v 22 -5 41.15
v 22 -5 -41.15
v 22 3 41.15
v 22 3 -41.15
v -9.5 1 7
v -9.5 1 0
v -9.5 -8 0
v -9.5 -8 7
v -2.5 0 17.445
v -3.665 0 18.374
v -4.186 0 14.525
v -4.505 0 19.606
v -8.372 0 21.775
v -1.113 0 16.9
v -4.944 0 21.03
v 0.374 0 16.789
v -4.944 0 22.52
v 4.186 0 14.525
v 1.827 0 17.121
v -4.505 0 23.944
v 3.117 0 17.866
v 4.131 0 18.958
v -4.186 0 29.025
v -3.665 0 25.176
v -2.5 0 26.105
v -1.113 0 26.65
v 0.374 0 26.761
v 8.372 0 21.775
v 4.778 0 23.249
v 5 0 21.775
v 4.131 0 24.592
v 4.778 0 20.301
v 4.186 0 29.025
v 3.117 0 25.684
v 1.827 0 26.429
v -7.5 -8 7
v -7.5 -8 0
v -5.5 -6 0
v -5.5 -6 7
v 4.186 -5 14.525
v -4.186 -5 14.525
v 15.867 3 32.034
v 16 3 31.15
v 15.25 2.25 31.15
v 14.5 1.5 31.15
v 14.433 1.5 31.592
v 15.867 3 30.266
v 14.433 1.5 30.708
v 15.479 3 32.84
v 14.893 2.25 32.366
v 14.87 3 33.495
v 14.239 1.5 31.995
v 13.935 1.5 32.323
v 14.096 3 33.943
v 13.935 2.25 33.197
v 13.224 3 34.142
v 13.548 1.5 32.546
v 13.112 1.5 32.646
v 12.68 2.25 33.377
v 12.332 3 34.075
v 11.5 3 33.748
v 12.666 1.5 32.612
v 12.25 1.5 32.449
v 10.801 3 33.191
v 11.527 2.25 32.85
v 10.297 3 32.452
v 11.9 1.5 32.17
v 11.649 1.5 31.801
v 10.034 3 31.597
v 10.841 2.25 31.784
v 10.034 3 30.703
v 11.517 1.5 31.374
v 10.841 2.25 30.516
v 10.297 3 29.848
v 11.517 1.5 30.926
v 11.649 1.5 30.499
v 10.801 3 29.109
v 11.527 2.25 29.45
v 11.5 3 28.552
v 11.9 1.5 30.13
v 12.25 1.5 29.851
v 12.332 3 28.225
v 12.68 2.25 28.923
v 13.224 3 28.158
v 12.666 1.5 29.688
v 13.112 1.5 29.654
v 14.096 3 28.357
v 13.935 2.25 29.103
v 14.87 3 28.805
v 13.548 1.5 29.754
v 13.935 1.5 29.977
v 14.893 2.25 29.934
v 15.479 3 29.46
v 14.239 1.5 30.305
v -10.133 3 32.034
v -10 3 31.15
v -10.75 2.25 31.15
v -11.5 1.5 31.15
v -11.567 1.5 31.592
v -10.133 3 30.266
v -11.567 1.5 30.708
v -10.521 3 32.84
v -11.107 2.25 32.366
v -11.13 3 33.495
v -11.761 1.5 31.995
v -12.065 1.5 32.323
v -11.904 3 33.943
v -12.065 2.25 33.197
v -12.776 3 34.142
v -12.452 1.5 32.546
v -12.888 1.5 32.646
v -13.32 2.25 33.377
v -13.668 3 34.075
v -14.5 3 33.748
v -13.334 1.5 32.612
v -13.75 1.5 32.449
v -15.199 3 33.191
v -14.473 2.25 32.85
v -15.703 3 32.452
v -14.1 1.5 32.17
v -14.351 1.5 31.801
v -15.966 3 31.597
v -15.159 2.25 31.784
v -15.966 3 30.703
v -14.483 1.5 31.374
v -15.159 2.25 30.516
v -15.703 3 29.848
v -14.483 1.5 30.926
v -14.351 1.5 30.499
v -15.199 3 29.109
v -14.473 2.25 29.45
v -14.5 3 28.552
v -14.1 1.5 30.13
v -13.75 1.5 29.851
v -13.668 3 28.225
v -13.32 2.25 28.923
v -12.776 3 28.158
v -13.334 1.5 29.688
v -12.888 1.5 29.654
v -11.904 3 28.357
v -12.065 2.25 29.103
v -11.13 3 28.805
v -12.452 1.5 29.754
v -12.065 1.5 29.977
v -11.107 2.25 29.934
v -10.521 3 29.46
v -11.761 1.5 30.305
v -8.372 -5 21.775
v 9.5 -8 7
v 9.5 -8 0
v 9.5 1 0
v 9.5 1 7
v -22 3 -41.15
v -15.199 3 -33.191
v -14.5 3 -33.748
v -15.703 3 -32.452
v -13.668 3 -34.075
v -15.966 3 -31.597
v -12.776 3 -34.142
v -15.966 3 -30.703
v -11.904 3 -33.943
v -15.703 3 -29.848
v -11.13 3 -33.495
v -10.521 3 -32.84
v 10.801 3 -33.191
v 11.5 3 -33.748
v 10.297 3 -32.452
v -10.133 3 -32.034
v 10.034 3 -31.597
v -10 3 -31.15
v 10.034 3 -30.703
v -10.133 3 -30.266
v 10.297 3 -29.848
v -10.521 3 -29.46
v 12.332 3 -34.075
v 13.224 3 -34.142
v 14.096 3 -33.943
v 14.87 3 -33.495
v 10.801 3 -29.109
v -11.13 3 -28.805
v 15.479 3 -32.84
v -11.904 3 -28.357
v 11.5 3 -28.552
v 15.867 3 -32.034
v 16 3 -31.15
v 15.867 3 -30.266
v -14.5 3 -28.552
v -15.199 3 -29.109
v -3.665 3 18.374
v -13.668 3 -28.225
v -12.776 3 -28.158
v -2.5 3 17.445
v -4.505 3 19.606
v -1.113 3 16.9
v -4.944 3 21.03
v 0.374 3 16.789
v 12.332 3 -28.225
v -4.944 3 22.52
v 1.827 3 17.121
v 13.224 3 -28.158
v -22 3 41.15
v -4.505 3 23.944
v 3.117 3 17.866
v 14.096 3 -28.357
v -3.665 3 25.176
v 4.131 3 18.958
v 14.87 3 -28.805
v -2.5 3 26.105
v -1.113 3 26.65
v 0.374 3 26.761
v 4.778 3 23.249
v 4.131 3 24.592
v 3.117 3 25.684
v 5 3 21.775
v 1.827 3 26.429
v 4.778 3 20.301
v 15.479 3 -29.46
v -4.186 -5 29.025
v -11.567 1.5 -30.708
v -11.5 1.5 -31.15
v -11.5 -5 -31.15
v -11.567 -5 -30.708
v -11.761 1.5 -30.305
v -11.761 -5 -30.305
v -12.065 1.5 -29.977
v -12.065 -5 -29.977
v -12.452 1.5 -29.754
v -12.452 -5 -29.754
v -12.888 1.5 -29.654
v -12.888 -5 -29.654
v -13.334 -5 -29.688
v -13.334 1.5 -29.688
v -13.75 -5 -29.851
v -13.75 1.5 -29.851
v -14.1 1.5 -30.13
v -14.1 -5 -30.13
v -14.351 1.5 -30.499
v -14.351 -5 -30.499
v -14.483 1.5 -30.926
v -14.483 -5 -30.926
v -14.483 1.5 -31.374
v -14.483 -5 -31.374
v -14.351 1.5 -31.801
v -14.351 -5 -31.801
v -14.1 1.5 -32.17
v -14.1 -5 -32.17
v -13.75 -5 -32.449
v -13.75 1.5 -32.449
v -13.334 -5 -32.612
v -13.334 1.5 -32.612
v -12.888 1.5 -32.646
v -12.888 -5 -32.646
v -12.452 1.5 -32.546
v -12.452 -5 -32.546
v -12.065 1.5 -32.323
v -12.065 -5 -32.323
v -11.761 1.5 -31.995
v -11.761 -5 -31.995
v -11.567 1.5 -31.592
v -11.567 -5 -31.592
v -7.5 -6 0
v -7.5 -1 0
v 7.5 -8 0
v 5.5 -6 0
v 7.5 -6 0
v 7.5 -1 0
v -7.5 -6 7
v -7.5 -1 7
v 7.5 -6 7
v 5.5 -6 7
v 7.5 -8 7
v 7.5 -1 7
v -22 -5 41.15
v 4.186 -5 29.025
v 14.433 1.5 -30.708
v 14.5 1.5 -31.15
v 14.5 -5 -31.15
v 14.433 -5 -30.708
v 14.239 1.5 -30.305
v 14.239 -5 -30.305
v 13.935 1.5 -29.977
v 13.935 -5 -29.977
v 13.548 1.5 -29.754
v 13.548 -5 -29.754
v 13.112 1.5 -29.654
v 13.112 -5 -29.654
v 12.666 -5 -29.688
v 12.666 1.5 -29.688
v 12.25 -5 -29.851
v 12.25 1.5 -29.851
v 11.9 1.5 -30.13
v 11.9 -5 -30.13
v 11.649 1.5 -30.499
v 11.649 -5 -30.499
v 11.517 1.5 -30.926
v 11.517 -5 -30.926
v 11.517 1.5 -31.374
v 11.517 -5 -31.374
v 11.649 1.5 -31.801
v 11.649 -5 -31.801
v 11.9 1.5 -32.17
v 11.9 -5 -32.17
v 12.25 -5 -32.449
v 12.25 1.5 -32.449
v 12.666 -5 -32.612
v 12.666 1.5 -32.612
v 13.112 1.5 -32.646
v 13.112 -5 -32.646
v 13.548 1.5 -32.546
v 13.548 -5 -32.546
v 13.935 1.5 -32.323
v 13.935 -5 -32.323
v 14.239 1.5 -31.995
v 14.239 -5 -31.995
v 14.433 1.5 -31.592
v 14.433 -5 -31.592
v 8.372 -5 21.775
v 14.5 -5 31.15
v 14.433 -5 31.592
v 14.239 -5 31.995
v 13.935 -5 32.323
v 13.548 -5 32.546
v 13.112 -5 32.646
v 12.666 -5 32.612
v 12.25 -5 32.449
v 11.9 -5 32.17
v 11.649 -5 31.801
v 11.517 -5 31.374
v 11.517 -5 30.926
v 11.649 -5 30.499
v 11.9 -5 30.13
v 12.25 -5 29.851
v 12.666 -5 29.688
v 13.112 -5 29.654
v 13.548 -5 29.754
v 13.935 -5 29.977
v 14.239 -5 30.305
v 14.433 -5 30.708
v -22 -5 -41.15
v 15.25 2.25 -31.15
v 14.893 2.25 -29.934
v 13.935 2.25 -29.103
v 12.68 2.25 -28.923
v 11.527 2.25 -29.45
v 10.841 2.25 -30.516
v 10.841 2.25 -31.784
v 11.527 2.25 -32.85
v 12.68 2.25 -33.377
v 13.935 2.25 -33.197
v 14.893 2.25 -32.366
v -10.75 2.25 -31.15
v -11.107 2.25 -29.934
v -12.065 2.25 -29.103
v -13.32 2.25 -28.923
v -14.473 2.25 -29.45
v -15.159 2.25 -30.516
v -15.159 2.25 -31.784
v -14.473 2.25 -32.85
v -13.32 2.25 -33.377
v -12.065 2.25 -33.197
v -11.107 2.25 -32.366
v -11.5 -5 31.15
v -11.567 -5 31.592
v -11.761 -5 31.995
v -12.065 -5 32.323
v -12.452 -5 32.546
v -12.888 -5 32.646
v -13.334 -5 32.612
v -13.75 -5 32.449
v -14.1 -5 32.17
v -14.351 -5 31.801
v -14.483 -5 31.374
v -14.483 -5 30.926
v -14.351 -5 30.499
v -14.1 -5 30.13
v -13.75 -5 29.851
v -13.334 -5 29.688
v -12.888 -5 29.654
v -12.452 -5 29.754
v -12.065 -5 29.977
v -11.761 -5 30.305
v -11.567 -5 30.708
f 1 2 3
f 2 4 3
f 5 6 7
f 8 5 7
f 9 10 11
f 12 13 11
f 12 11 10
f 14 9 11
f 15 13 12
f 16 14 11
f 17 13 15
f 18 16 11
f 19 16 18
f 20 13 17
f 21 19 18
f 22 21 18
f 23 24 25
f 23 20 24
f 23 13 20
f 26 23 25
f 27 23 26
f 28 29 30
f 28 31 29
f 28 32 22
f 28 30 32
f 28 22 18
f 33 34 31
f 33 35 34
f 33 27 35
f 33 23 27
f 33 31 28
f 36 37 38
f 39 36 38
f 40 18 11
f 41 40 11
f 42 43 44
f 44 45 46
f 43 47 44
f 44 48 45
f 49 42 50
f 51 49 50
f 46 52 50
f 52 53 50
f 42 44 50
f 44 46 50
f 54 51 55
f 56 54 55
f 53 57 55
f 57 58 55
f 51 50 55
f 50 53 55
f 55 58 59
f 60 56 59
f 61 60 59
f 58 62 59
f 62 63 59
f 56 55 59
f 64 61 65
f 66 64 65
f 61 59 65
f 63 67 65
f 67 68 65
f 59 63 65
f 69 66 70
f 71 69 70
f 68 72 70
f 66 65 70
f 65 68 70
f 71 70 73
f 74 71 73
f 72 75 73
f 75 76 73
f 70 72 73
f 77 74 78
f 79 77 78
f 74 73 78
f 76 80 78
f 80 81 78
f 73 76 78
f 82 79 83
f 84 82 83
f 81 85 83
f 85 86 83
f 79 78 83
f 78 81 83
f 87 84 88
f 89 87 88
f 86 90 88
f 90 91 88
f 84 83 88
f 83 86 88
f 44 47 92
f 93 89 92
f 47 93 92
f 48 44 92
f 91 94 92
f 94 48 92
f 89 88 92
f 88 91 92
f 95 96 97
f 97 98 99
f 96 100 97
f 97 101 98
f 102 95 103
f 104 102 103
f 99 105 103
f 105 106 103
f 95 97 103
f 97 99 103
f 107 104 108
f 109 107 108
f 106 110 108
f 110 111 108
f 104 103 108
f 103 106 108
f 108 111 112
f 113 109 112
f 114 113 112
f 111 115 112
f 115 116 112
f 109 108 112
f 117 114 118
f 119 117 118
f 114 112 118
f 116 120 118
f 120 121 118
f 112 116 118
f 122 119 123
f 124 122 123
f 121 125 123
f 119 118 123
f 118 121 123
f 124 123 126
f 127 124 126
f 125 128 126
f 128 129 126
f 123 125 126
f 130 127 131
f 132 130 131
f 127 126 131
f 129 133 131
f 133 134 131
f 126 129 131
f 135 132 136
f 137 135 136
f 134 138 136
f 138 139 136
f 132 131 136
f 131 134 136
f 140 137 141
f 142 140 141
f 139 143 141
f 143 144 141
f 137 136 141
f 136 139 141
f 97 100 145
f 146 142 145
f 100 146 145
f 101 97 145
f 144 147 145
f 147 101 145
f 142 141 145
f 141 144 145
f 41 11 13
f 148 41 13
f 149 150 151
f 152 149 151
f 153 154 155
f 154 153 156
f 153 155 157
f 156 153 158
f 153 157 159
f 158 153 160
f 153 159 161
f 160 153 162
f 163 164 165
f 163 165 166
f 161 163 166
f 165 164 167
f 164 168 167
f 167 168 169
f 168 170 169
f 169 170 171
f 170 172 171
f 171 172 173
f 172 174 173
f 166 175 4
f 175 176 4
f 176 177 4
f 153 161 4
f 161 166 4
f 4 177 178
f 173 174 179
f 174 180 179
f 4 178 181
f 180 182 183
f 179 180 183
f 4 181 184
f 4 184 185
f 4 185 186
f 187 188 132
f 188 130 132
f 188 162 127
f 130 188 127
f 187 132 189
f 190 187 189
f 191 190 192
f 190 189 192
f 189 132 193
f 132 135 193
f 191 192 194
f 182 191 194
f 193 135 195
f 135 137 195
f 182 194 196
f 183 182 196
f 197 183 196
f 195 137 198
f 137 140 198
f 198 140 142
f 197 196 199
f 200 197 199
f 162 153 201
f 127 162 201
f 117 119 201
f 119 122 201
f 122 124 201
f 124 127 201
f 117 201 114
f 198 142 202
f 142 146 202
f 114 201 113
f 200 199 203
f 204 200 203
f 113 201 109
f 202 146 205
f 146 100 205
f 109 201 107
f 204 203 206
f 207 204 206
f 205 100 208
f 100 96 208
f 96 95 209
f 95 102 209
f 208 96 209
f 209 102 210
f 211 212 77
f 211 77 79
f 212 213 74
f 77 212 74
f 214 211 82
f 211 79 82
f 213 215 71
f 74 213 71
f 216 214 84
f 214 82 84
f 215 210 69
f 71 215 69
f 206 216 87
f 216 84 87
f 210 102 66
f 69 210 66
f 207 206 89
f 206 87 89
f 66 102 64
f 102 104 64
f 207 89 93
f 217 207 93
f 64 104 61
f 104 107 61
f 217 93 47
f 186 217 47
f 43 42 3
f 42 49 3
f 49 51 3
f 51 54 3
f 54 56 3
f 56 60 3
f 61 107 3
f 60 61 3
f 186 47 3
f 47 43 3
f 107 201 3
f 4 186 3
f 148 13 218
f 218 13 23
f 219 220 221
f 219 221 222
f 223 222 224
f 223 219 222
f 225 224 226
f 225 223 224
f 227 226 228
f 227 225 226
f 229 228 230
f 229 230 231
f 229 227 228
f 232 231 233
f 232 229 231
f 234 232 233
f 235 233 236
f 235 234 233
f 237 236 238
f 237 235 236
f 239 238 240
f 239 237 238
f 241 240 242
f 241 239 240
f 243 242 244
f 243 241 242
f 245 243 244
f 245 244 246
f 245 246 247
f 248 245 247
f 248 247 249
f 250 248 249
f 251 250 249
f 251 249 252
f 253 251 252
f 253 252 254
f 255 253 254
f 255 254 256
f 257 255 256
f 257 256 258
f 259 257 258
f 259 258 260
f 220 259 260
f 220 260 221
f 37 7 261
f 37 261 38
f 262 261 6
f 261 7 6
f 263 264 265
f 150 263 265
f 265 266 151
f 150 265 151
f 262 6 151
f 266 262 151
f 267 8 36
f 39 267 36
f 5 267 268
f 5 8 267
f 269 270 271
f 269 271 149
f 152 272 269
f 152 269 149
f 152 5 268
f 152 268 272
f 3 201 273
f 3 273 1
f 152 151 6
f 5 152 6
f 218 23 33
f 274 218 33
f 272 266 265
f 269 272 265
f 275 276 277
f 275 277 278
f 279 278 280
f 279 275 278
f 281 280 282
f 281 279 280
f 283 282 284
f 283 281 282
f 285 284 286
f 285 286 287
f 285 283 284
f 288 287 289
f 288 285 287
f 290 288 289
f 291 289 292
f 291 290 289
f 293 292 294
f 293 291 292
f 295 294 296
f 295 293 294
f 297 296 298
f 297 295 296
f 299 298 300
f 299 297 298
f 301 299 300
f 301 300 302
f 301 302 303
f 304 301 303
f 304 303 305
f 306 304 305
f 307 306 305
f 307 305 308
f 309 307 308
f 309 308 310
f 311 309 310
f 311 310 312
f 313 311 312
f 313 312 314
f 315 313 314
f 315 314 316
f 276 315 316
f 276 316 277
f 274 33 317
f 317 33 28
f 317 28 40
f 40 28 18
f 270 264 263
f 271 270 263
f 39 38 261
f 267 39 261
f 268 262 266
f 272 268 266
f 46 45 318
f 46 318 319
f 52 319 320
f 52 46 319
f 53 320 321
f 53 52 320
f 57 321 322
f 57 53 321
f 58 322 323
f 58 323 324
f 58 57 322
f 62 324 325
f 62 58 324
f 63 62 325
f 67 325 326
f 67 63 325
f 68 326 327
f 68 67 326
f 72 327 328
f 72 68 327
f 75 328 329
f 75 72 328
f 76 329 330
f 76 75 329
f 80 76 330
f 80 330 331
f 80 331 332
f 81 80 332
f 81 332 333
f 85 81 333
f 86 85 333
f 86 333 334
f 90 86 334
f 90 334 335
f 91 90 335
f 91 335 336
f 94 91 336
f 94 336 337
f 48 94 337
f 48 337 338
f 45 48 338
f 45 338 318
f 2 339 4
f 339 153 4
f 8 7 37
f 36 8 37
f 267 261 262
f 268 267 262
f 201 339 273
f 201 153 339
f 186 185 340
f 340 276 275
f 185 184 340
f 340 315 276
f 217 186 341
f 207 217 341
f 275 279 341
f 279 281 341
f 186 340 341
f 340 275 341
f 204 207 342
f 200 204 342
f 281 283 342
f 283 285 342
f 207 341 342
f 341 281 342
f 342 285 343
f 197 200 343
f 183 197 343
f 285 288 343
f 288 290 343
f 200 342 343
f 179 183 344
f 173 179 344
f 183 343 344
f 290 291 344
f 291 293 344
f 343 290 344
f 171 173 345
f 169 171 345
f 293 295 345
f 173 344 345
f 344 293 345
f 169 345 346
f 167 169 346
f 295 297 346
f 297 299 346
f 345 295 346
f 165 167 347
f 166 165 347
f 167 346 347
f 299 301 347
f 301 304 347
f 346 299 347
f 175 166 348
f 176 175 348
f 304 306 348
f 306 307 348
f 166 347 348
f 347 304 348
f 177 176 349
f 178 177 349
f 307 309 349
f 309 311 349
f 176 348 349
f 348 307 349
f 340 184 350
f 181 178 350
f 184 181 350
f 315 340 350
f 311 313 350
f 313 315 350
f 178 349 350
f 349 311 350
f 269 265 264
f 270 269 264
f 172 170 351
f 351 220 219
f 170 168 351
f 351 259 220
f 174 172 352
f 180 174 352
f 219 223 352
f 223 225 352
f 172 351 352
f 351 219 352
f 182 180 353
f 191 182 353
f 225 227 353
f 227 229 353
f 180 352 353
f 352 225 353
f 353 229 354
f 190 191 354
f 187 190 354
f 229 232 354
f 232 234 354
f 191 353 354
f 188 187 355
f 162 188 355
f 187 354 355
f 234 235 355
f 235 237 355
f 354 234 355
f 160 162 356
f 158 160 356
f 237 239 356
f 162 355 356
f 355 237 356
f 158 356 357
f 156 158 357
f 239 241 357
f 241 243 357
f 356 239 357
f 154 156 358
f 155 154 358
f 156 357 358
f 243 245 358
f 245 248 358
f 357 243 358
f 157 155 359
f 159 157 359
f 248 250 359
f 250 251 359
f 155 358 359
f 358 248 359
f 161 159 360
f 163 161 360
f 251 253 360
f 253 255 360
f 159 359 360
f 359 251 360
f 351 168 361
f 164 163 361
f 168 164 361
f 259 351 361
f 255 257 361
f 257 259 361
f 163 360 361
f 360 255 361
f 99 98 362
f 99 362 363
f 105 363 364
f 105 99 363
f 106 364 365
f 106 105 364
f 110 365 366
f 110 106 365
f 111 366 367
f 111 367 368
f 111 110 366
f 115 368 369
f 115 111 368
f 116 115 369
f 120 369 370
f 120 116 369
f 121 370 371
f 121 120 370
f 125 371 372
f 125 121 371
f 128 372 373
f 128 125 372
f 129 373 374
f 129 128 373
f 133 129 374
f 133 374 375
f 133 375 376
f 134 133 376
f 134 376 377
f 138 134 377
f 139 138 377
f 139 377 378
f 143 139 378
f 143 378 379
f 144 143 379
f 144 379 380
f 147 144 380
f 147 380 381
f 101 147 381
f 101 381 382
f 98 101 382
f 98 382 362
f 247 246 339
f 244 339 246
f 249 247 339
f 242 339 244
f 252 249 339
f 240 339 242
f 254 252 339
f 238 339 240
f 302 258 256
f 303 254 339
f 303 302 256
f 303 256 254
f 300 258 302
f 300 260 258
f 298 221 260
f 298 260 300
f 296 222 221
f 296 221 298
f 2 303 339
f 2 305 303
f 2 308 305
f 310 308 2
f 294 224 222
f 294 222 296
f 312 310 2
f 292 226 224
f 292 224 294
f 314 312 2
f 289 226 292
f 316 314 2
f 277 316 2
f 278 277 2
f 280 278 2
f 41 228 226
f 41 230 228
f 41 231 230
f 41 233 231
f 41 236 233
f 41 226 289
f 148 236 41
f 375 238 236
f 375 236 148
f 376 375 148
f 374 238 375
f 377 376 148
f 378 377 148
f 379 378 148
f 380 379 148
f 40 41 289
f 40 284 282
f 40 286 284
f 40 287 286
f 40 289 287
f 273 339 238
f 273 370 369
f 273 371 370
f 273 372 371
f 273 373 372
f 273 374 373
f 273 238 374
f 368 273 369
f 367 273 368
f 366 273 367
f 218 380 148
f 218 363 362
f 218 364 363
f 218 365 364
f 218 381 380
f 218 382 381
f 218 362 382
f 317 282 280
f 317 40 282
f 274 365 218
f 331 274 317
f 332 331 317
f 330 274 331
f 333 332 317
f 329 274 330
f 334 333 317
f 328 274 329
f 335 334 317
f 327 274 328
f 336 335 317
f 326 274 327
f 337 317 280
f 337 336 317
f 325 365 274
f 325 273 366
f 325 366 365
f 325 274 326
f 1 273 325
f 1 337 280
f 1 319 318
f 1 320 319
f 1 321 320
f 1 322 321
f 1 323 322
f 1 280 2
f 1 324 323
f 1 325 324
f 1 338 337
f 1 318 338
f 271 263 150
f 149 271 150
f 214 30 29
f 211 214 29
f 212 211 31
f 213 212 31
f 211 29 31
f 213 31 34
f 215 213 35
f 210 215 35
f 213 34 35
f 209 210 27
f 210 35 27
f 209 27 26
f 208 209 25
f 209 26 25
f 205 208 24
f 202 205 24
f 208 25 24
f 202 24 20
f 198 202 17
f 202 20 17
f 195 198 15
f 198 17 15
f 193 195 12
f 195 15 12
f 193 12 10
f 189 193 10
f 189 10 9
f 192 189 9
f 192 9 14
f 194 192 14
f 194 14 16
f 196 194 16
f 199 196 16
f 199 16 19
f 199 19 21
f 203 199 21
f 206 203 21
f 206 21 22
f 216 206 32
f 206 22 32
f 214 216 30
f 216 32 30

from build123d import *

# Parameters (mm, degrees)
F0_W     = 44
F0_H     = 82.3
F0_R     = 1.5
F0_R_2   = 5
F1_DEPTH = 3
F2_DEPTH = 5
F3_SIZE  = 1.5
F4_W     = 15
F4_H     = 2
F5_DEPTH = 7


with BuildPart() as f1:
    # F0 (on Front) → F1 (new body)
    with BuildSketch(Plane.XZ):
        Rectangle(F0_W, F0_H)
        with Locations((-13, -31.15)):
            Circle(F0_R, mode=Mode.SUBTRACT)
        with Locations((13, -31.15)):
            Circle(F0_R, mode=Mode.SUBTRACT)
        with Locations((-13, 31.15)):
            Circle(F0_R, mode=Mode.SUBTRACT)
        Polygon((-4.185789, 14.525), (-8.371579, 21.775), (-4.185789, 29.025), (4.185789, 29.025), (8.371579, 21.775), (4.185789, 14.525), align=None, mode=Mode.SUBTRACT)
        with Locations((13, 31.15)):
            Circle(F0_R, mode=Mode.SUBTRACT)
        Polygon((-4.185789, 29.025), (-8.371579, 21.775), (-4.185789, 14.525), (4.185789, 14.525), (8.371579, 21.775), (4.185789, 29.025), align=None)
        with Locations((0, 21.775)):
            Circle(F0_R_2, mode=Mode.SUBTRACT)
    extrude(amount=-F1_DEPTH)

    # F0 (on Front) → F2 (join)
    with BuildSketch(Plane.XZ):
        Rectangle(F0_W, F0_H)
        with Locations((-13, -31.15)):
            Circle(F0_R, mode=Mode.SUBTRACT)
        with Locations((13, -31.15)):
            Circle(F0_R, mode=Mode.SUBTRACT)
        with Locations((-13, 31.15)):
            Circle(F0_R, mode=Mode.SUBTRACT)
        Polygon((-4.185789, 14.525), (-8.371579, 21.775), (-4.185789, 29.025), (4.185789, 29.025), (8.371579, 21.775), (4.185789, 14.525), align=None, mode=Mode.SUBTRACT)
        with Locations((13, 31.15)):
            Circle(F0_R, mode=Mode.SUBTRACT)
    extrude(amount=F2_DEPTH)

    # F3
    f3_edges = [f1.edges().sort_by_distance(p)[0] for p in [
        (11.5, 3, 31.15),
        (-14.5, 3, 31.15),
        (-14.5, 3, -31.15),
        (11.5, 3, -31.15),
    ]]
    chamfer(f3_edges, length=F3_SIZE)


with BuildPart() as f5:
    # F4 (on Top) → F5 (new body)
    with BuildSketch(Plane.XY):
        Polygon((-7.5, -1), (-7.5, 1), (-9.5, 1), (-9.5, -8), (-7.5, -8), (-7.5, -6), align=None)
        Polygon((-5.5, -6), (-7.5, -6), (-7.5, -8), align=None)
        Rectangle(F4_W, F4_H)
        Polygon((9.5, 1), (7.5, 1), (7.5, -1), (7.5, -6), (7.5, -8), (9.5, -8), align=None)
        Polygon((7.5, -8), (7.5, -6), (5.5, -6), align=None)
    extrude(amount=F5_DEPTH)


solid = Compound([f1.part, f5.part])
